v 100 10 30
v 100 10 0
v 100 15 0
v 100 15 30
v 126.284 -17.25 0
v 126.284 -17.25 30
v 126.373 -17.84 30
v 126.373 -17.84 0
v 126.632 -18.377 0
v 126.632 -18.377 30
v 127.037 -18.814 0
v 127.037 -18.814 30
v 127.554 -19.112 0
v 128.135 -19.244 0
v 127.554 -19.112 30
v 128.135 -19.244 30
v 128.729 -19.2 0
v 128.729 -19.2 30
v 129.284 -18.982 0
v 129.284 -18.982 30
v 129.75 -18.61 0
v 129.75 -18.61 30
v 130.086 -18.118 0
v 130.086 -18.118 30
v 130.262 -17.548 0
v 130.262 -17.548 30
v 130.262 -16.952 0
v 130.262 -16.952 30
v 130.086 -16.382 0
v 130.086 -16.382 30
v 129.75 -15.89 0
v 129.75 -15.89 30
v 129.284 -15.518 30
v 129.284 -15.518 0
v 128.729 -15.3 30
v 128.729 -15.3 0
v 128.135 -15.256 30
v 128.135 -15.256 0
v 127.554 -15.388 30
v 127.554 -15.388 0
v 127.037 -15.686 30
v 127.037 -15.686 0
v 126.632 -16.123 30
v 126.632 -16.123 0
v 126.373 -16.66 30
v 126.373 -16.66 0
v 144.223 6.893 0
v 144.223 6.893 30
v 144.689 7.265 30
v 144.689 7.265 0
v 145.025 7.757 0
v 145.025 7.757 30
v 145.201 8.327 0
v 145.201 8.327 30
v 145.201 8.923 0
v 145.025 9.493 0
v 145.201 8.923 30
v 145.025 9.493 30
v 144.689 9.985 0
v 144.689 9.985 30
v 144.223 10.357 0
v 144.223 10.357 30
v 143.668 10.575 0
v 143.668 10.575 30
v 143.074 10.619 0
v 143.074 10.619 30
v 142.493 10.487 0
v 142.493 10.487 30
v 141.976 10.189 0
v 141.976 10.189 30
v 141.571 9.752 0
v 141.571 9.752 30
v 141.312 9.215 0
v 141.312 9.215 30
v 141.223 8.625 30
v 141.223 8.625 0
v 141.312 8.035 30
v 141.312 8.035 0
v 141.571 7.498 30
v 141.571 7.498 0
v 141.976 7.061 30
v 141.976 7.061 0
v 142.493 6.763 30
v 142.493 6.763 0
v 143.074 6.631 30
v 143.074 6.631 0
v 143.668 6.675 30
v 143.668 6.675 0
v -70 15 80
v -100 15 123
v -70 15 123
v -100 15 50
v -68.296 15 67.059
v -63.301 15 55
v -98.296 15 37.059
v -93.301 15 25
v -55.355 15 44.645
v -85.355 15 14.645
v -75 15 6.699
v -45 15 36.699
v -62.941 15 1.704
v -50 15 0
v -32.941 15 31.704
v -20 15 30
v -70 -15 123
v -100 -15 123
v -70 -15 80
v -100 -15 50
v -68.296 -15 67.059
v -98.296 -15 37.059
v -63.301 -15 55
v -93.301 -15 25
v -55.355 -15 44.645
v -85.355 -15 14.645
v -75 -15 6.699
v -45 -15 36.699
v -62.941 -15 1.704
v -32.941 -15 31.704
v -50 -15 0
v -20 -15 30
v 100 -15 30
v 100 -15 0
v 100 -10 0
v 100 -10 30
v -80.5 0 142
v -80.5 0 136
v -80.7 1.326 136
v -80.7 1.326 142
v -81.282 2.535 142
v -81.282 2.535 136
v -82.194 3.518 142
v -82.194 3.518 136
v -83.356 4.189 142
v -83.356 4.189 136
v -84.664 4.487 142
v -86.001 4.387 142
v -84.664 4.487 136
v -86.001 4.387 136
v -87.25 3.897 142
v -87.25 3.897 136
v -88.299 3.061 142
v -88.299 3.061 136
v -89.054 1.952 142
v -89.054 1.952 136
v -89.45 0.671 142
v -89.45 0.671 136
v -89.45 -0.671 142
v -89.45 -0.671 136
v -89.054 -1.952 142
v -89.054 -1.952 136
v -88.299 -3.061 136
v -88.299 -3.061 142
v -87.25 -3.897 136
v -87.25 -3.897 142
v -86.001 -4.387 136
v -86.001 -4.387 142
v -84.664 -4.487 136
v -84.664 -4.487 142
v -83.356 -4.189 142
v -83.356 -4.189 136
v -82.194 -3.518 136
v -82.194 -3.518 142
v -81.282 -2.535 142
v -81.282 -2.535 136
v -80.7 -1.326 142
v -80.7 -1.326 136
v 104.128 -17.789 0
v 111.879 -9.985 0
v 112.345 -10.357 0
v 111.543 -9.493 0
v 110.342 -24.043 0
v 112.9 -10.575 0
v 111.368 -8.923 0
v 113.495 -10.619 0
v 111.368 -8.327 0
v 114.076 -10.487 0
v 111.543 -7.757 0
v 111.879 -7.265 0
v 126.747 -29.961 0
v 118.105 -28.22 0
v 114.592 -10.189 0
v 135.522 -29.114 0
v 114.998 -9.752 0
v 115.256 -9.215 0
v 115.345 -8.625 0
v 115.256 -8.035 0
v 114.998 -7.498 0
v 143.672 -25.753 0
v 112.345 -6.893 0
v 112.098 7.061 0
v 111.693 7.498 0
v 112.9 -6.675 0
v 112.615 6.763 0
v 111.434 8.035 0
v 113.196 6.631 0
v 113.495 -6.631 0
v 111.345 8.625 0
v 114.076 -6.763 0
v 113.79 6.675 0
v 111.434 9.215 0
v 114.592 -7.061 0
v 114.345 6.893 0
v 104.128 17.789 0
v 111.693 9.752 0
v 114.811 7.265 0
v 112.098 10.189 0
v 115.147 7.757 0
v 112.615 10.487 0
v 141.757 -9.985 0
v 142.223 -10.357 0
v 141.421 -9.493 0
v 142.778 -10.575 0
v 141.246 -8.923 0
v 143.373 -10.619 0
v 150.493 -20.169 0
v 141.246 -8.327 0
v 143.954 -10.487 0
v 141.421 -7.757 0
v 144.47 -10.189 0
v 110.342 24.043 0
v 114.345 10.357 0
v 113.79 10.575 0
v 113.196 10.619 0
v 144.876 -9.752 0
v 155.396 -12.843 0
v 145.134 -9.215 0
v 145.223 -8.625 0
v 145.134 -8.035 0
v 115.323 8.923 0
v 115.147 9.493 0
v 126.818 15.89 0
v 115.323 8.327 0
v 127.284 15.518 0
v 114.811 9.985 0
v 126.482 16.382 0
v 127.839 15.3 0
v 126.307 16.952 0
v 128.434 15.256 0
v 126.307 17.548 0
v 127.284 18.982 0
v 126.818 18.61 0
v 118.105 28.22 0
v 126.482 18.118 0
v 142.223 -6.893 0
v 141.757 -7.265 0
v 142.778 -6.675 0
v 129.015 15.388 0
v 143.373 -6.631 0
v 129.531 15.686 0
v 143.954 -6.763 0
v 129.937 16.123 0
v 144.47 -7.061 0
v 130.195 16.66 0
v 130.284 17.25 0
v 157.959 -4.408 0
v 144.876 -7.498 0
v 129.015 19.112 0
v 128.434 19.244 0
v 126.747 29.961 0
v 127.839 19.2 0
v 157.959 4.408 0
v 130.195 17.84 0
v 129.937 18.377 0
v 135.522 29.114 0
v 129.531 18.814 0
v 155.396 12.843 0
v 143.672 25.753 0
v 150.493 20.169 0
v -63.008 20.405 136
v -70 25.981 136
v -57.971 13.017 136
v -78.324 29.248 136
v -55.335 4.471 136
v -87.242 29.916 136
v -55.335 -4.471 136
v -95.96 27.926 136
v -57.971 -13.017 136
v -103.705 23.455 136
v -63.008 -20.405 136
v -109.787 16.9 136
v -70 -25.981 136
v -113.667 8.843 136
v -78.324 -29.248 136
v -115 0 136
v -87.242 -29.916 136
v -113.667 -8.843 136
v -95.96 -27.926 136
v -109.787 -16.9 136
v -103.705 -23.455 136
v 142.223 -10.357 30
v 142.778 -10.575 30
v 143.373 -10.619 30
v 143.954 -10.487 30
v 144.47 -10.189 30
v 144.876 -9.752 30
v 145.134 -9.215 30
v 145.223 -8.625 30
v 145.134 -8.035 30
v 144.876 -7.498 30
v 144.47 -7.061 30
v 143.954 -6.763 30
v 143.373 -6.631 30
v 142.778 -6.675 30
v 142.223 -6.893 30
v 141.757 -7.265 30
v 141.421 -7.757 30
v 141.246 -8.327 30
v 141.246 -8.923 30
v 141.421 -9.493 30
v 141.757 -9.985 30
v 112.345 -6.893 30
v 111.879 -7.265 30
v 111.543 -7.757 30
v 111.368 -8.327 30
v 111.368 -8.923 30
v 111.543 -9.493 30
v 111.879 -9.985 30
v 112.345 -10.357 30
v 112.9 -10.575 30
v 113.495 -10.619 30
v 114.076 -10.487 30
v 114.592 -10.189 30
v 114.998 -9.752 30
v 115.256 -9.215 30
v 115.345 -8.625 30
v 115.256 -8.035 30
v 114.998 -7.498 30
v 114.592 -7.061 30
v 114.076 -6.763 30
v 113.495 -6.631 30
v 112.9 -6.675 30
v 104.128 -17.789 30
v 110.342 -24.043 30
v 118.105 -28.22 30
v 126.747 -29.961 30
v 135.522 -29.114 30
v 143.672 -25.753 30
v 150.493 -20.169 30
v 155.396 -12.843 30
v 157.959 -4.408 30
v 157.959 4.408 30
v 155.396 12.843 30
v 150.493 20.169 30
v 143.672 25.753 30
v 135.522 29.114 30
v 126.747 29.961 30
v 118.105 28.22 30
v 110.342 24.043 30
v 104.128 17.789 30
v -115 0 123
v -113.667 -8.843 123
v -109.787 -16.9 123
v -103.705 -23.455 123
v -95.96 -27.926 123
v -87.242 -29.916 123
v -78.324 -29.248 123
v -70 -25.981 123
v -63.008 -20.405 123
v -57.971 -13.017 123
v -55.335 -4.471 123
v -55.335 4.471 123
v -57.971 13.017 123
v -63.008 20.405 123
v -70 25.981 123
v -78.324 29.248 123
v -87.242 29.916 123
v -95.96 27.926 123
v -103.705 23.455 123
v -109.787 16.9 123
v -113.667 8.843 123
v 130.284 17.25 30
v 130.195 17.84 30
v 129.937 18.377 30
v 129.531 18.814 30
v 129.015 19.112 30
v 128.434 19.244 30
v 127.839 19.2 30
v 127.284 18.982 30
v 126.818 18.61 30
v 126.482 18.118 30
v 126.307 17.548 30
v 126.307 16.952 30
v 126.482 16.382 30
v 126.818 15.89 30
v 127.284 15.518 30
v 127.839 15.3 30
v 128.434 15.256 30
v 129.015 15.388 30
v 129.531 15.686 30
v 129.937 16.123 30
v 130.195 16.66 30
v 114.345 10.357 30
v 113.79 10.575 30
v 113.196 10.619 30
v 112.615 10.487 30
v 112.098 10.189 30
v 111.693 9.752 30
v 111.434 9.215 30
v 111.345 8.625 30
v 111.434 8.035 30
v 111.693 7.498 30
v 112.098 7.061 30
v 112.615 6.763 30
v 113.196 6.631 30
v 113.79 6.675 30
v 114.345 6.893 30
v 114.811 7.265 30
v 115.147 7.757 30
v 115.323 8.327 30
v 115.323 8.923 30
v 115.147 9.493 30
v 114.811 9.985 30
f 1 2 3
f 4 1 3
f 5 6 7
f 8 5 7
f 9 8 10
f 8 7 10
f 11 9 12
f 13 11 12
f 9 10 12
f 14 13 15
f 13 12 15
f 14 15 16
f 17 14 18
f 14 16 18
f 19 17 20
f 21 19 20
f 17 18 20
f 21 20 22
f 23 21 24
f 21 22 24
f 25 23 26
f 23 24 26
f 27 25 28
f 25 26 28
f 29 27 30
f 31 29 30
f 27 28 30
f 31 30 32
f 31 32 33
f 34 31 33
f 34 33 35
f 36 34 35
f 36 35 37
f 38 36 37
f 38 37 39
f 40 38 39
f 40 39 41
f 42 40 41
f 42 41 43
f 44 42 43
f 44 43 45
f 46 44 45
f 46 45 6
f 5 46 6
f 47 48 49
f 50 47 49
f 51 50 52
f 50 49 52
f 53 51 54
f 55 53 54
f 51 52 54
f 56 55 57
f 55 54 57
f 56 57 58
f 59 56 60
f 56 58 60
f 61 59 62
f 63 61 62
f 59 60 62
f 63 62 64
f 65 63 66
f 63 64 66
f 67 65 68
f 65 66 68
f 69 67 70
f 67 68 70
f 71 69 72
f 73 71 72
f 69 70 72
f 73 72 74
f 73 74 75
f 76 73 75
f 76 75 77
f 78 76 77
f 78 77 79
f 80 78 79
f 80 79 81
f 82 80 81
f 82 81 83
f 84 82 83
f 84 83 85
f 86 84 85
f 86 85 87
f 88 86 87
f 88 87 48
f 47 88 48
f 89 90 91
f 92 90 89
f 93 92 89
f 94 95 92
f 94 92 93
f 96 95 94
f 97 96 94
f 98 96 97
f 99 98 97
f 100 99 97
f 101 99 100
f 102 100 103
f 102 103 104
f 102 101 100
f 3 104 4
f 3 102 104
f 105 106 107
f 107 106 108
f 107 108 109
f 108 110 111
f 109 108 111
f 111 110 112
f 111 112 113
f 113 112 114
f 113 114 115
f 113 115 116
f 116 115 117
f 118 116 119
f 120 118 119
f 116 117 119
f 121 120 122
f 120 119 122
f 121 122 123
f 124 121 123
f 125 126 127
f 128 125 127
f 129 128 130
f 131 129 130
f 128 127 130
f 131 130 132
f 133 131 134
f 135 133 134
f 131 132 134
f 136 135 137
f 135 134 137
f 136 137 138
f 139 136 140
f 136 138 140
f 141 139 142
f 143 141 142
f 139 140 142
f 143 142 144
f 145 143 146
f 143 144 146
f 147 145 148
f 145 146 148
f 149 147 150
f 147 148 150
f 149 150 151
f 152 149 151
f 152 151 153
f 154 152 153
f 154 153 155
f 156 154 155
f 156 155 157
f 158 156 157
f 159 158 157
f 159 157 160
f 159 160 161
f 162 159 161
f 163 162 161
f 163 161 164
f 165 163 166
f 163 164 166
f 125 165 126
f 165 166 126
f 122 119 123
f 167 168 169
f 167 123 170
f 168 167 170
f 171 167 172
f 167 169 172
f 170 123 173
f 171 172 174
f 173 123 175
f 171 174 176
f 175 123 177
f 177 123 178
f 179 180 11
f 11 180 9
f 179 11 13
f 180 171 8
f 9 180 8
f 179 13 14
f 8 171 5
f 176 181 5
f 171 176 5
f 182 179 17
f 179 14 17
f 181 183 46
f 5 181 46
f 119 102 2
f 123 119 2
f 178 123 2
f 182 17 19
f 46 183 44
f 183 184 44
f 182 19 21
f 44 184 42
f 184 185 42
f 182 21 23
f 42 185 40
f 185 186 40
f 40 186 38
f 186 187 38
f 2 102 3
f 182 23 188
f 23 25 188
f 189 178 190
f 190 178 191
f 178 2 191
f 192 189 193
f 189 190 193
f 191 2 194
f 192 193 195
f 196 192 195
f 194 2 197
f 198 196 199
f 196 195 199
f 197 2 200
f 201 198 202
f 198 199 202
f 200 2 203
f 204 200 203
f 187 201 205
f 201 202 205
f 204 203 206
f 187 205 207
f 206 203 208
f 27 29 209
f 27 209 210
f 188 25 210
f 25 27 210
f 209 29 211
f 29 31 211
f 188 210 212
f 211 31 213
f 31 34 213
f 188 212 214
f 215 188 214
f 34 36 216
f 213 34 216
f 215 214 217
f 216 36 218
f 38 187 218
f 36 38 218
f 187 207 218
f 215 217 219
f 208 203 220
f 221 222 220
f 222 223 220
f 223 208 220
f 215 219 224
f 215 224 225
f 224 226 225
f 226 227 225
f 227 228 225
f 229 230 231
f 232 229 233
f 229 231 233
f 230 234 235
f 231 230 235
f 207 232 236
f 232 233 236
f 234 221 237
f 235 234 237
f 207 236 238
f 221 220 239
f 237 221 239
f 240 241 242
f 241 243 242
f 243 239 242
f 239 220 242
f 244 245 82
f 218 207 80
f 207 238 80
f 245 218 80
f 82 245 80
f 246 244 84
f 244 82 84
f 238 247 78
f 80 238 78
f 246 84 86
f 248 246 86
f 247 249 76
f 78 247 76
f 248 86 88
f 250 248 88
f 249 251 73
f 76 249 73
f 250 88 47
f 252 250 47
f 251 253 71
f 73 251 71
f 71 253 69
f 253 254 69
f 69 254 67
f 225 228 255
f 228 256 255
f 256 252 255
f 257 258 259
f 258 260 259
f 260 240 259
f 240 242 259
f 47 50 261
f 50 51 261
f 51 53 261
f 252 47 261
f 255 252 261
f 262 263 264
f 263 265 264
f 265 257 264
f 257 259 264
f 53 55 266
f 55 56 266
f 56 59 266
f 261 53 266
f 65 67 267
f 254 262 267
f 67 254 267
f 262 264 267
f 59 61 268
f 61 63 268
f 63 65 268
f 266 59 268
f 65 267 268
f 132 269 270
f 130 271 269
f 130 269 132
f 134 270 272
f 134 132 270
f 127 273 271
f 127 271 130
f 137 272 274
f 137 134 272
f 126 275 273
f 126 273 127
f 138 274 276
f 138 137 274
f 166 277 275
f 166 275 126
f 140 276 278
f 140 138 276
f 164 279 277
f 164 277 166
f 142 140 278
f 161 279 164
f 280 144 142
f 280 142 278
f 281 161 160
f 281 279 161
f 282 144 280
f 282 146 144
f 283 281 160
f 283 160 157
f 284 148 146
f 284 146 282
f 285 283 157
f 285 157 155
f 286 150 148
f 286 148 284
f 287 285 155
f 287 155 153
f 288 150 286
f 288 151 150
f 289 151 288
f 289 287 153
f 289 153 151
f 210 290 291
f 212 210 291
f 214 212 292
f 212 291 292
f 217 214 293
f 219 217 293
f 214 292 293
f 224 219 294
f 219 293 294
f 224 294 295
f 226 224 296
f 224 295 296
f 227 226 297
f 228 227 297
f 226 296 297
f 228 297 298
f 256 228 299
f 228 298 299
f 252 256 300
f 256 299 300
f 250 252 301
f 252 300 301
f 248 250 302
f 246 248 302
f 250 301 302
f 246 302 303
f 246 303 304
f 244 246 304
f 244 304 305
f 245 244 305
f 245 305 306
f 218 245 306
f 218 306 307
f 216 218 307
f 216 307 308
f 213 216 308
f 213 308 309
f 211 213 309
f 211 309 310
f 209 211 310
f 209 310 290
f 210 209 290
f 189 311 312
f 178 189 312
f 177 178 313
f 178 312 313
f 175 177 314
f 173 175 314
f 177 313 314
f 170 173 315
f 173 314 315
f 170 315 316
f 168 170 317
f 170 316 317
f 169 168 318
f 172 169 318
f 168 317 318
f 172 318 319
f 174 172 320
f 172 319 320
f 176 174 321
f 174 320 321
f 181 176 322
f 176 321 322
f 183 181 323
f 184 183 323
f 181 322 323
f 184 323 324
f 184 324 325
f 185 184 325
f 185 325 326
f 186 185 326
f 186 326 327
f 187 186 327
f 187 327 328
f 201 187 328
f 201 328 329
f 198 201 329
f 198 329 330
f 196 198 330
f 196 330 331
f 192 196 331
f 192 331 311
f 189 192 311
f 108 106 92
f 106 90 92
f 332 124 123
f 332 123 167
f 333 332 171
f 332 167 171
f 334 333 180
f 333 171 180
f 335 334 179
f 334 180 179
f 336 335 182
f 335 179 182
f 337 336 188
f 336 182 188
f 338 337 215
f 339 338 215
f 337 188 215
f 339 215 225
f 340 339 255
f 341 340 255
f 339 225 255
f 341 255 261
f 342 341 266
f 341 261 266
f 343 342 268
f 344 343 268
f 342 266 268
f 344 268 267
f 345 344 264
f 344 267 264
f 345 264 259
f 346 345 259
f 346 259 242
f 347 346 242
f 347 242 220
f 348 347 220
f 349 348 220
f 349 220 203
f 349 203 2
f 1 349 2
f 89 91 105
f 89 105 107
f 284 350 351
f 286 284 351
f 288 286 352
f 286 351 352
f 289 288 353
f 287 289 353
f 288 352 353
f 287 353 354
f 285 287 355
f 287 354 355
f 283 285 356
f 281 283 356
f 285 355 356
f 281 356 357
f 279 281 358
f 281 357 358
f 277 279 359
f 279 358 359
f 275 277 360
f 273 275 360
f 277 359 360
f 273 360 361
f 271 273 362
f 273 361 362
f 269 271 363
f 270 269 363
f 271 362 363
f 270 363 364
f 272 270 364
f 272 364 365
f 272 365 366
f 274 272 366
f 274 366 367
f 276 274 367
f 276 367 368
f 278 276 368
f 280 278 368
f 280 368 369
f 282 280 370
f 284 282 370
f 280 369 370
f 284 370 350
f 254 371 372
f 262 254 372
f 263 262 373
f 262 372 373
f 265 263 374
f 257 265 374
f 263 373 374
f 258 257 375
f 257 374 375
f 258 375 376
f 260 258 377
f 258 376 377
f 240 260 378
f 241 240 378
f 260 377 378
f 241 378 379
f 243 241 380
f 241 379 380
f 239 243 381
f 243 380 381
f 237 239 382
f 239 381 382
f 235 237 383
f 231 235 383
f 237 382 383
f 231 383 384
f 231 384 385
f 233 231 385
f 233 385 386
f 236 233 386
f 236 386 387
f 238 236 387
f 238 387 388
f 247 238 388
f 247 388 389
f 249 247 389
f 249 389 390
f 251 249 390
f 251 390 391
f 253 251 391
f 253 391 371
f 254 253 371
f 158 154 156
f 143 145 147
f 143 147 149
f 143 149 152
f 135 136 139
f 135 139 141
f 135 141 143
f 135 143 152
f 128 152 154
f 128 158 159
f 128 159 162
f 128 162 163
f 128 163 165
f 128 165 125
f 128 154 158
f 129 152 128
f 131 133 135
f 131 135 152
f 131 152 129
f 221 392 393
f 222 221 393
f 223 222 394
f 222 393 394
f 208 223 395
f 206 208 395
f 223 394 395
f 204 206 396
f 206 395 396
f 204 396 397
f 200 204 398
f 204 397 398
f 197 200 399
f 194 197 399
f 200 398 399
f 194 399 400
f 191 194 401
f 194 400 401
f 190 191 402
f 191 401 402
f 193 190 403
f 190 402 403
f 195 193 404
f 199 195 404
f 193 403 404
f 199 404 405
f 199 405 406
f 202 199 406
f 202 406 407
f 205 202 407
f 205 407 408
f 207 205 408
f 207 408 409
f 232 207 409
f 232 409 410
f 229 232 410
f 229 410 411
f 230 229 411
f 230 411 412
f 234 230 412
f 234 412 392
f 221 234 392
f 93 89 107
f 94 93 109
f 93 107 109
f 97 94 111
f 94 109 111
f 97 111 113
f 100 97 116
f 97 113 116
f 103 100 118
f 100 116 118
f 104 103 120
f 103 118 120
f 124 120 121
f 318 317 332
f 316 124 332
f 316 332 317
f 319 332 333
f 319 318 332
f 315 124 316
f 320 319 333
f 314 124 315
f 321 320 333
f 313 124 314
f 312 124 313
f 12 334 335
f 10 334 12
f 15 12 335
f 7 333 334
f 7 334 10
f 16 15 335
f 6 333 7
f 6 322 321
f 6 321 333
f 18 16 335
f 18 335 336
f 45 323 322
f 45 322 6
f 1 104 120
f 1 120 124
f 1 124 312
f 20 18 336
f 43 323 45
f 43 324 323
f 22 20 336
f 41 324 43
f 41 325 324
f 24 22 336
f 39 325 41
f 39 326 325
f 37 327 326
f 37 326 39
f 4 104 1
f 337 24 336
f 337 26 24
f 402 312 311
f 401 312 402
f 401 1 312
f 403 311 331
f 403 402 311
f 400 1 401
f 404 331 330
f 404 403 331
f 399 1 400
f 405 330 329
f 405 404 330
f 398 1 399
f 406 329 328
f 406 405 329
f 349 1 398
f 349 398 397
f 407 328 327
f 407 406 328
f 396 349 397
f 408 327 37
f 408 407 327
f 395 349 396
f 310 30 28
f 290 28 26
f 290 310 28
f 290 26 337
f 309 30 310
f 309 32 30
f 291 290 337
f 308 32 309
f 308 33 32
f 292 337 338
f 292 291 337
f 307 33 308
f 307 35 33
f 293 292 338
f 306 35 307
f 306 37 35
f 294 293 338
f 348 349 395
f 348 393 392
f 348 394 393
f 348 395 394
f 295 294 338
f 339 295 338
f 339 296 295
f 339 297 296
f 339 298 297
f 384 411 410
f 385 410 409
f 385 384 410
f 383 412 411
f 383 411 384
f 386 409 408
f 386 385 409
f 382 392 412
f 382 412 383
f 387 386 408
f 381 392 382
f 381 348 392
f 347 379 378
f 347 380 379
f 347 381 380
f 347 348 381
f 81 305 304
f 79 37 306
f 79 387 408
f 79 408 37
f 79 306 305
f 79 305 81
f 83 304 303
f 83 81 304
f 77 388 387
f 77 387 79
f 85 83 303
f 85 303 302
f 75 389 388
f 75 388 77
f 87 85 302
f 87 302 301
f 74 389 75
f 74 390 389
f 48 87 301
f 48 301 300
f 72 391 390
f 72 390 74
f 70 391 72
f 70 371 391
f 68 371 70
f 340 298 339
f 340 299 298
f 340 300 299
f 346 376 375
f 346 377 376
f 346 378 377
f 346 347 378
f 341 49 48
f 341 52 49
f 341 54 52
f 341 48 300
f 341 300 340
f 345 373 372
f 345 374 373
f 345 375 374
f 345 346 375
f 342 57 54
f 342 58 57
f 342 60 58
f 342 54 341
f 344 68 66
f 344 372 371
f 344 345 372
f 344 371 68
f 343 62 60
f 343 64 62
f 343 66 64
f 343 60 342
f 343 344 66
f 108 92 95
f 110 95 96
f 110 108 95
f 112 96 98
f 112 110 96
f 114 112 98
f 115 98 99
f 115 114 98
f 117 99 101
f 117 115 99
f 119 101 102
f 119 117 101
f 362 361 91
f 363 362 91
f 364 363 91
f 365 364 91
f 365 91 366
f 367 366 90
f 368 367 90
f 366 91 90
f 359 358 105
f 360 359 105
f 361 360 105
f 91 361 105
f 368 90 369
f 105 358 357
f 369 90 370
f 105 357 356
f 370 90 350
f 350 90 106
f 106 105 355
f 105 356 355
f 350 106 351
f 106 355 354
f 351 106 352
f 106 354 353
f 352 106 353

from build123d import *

# Parameters (mm, degrees)
EXTRUDE_1_DEPTH          = 30
SKETCH_12_W              = 30
SKETCH_12_H              = 93
EXTRUDE_6_DEPTH          = 30
SKETCH_16_R              = 30
EXTRUDE_9_DEPTH          = 13
FILLET_1_R               = 50
FILLET_2_R               = 50
SKETCH_17_R              = 2
CUT_EXTRUDE_1_DEPTH      = 193.846857699
PATTERN_CIRCULAR_1_COUNT = 6
SKETCH_18_R              = 4.5
EXTRUDE_10_DEPTH         = 6


with BuildPart() as part:
    # 草图1 → 凸台-拉伸1 (new body)
    with BuildSketch(Plane.XY):
        Polygon((100, -10), (100, 0), (100, 10), (100, 15), (-100, 15), (-100, -15), (100, -15), align=None)
        with BuildLine():
            Line((100, 10), (100, 0))
            Line((100, 0), (100, -10))
            ThreePointArc((100, -10), (158.284271247, 0), (100, 10))
        make_face()
    extrude(amount=EXTRUDE_1_DEPTH)

    # 草图12 → 凸台-拉伸6 (add)
    with BuildSketch(Plane(origin=(0, 15, 0), x_dir=(1, 0, 0), z_dir=(0, 1, 0))):
        with Locations((-85, -76.5)):
            Rectangle(SKETCH_12_W, SKETCH_12_H)
    extrude(amount=-EXTRUDE_6_DEPTH)

    # 草图16 → 凸台-拉伸9 (add)
    with BuildSketch(Plane.XY.offset(123)):
        with Locations(Location((-85, 0, 0), (0, 0, 180))):
            Circle(SKETCH_16_R)
    extrude(amount=EXTRUDE_9_DEPTH)

    # 圆角1
    fillet_1_edges = [part.edges().sort_by_distance(p)[0] for p in [
        (-70, 0, 30),
    ]]
    fillet(fillet_1_edges, radius=FILLET_1_R)

    # 圆角2
    fillet_2_edges = [part.edges().sort_by_distance(p)[0] for p in [
        (-100, 0, 0),
    ]]
    fillet(fillet_2_edges, radius=FILLET_2_R)

    # 草图17 → 切除-拉伸1 (cut, through all)
    with BuildSketch(Plane.XY.offset(30)):
        with Locations((128.284271247, 17.25)):
            Circle(SKETCH_17_R)
    cut_extrude_1 = extrude(amount=-CUT_EXTRUDE_1_DEPTH, mode=Mode.SUBTRACT)

    # 阵列(圆周)1: 切除-拉伸1 ×6 about axis
    pattern_circular_1_axis = Axis((128.284271247, 0, 0), (0, 0, 1))
    for i in range(1, PATTERN_CIRCULAR_1_COUNT):
        add(cut_extrude_1.rotate(pattern_circular_1_axis, i * 360 / PATTERN_CIRCULAR_1_COUNT), mode=Mode.SUBTRACT)

    # 草图18 → 凸台-拉伸10 (add)
    with BuildSketch(Plane.XY.offset(136)):
        with Locations((-85, 0)):
            Circle(SKETCH_18_R)
    extrude(amount=EXTRUDE_10_DEPTH)


solid = part.part
